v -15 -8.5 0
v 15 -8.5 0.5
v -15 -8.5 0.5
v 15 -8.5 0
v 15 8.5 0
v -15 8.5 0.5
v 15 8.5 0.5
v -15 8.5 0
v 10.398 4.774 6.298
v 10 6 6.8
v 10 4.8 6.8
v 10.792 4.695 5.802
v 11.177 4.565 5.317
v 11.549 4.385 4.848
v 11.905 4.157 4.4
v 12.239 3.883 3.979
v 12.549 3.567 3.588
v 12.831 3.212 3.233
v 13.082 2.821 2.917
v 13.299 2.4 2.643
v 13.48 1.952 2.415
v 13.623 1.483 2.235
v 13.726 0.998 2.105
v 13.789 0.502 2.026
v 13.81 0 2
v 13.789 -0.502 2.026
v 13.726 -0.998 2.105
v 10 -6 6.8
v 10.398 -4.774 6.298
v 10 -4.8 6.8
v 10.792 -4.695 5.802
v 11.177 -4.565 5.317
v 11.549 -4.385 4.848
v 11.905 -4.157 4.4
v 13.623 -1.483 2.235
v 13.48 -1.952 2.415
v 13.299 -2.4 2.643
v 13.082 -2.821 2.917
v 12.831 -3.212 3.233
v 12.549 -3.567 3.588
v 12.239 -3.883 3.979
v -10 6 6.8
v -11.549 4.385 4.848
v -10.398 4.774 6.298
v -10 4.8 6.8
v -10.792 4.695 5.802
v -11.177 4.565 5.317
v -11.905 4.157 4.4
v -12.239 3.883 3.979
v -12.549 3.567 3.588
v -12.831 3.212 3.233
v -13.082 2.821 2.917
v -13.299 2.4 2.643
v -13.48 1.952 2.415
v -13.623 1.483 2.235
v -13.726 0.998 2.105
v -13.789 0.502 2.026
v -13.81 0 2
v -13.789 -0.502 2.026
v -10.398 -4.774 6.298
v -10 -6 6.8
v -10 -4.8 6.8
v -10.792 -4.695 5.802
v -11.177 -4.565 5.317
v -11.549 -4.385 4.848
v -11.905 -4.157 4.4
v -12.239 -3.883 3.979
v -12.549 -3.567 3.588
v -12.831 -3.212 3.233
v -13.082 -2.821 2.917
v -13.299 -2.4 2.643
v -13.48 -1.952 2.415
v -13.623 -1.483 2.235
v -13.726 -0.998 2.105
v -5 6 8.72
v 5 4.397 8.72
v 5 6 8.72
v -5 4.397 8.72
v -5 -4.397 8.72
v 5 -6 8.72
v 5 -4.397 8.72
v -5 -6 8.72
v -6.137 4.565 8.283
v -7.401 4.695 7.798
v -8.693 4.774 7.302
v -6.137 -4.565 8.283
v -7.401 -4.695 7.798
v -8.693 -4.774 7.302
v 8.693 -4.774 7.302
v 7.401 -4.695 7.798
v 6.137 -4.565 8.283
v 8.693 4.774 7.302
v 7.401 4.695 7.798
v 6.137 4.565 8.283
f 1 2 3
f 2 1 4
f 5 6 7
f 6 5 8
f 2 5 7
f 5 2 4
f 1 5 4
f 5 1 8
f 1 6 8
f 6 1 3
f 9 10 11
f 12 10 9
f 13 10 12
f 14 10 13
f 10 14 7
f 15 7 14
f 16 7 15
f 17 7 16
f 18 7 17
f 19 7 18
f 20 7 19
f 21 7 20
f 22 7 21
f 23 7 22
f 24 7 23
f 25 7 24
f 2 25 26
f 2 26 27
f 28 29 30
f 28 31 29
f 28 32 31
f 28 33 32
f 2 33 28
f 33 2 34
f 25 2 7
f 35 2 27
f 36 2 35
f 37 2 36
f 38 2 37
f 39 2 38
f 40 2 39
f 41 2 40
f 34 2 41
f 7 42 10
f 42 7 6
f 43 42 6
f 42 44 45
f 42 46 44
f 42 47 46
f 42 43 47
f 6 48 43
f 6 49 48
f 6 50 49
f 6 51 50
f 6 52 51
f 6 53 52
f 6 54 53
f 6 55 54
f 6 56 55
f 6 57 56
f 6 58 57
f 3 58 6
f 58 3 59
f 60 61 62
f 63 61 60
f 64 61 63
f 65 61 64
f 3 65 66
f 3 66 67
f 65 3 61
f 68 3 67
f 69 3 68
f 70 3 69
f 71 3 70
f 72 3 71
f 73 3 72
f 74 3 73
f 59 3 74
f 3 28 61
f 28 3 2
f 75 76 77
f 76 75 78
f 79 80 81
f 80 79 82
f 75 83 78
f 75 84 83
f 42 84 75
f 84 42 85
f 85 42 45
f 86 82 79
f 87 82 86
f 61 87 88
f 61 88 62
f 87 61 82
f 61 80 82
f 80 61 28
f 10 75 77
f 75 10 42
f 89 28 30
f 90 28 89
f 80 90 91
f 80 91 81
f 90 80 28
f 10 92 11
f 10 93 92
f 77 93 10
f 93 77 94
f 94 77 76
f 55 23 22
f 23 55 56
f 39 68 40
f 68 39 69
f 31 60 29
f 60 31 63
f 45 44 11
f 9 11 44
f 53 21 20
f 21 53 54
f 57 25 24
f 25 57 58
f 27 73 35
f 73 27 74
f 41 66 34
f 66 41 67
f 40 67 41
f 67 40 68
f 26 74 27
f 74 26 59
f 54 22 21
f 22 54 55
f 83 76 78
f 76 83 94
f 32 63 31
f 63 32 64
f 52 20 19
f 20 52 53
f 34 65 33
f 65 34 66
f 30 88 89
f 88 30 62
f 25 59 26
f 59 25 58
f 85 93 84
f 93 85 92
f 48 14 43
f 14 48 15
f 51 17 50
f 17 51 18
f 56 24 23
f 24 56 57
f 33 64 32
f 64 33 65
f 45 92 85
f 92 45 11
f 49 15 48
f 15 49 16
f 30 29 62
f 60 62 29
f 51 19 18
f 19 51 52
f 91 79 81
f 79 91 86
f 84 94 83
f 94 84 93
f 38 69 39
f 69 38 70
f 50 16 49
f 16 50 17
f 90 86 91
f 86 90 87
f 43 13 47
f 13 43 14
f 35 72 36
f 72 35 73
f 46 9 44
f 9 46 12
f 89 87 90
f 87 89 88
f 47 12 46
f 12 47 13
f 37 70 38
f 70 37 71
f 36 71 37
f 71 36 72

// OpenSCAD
// file: lib-command.scad
// Height is defined as the length from the non-tab end to where the adhesive stops opposite it — thus the minimum length required for a hook to not have either the strip sticking out both ends or the adhesive revealed.

command_small_w = 17;
command_small_h = 30;
command_medium_w = 16;
command_medium_h = 52;
command_large_w = 19;
command_large_h = 76;

// TODO: record size of "mini" strips. Note also that mini strips are slightly narrower than the picture hanging "stabilization" strips.
// main file
// Clip for a round cable which fits snugly inside (so that the clip does not need to be very springy).

include <lib-command.scad>

cable_diameter = 9.6;
hookness = cable_diameter * 0.2;

base_thickness = 2;

cable_center_z = base_thickness + cable_diameter / 2;

$fn = 60;
epsilon = 0.01;

main();

module main() {
    // Cable mock
    %translate([0, 0, cable_center_z])
    rotate([0, 90, 0])
    cylinder(d=cable_diameter, h=50, center=true);
    
    difference() {
        // Lower body section of clip
        hull_chain() {
            // Adhesive base plate
            linear_extrude(0.5)
            square([command_small_h, command_small_w], center=true);
 
            // Middle section
            translate([0, 0, cable_center_z])
            mirror([0, 0, 1])
            linear_extrude(0.5)
            square([command_small_h - 10, cable_diameter + 0.4 * 6], center=true);

            // Top section
            // TODO: kludgy, should be using sections of a cylinder
            translate([0, 0, cable_center_z + hookness])
            mirror([0, 0, 1])
            linear_extrude(0.5)
            square([command_small_h - 20, cable_diameter + 0.4 * 6], center=true);
            
            //bevel_cube([command_small_h, command_small_w, cable_center_z], 0.5);
        }
        
        // Cable cutaway + entrance
        translate([0, 0, cable_center_z])
        union() {
            rotate([0, 90, 0]) cylinder(d=cable_diameter, h=50, center=true);

            translate([0, 0, cable_diameter * 0.5])
            rotate([0, 90, 0]) cylinder(d=cable_diameter, h=50, center=true);
        }
    }
}

// hull_chain() { a; b; c; } = union() {
//     hull() { a; b; }
//     hull() { b; c; }
// }
module hull_chain() {
    if ($children <= 1) {
        children();
    } else {
        for (i = [0:$children-2]) {
            hull() children([i, i+1]);
        }
    }
}
